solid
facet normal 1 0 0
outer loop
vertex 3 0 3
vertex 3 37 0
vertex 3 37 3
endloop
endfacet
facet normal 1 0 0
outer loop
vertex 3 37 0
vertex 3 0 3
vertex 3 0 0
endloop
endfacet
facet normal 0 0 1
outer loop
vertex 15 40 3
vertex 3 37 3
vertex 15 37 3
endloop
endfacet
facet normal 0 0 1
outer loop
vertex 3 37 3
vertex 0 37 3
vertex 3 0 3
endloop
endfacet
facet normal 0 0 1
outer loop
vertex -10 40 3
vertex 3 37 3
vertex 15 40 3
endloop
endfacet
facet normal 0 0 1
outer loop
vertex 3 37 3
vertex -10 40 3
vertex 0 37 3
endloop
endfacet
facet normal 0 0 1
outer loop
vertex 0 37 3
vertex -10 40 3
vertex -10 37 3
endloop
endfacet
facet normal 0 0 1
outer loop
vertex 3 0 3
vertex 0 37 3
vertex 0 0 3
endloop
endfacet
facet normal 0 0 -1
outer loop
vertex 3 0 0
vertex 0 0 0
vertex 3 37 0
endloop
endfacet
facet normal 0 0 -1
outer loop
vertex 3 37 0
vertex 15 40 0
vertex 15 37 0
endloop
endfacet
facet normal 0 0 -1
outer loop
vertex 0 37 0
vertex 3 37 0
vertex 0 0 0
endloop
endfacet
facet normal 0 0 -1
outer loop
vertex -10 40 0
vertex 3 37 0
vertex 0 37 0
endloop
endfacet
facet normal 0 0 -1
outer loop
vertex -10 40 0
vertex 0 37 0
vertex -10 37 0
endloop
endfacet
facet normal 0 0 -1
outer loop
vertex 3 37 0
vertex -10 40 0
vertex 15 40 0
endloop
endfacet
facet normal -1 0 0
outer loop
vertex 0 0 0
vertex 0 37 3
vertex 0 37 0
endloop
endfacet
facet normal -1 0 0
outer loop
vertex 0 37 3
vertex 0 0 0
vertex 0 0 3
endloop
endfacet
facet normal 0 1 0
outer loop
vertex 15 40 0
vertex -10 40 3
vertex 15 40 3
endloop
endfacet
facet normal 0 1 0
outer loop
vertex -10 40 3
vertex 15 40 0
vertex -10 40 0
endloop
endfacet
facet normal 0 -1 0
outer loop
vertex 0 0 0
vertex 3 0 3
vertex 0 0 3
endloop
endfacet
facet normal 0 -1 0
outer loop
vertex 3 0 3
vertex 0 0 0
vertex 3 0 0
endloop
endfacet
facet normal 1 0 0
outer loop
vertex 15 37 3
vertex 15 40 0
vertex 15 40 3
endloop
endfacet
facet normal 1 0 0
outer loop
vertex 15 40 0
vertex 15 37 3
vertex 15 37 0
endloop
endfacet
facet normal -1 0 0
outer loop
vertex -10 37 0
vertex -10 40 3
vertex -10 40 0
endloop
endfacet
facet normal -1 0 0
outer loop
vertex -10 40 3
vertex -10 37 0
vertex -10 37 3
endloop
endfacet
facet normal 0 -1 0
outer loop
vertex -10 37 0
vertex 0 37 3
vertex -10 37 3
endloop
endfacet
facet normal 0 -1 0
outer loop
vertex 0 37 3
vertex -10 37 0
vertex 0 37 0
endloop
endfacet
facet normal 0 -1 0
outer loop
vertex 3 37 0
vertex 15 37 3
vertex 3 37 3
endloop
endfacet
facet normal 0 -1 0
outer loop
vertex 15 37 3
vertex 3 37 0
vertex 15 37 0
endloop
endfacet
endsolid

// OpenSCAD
x=3;
e=25;
union(){ 
cube([x,e+15,x]);
 translate([-10,37,0]) cube([e,x,x]);
}
